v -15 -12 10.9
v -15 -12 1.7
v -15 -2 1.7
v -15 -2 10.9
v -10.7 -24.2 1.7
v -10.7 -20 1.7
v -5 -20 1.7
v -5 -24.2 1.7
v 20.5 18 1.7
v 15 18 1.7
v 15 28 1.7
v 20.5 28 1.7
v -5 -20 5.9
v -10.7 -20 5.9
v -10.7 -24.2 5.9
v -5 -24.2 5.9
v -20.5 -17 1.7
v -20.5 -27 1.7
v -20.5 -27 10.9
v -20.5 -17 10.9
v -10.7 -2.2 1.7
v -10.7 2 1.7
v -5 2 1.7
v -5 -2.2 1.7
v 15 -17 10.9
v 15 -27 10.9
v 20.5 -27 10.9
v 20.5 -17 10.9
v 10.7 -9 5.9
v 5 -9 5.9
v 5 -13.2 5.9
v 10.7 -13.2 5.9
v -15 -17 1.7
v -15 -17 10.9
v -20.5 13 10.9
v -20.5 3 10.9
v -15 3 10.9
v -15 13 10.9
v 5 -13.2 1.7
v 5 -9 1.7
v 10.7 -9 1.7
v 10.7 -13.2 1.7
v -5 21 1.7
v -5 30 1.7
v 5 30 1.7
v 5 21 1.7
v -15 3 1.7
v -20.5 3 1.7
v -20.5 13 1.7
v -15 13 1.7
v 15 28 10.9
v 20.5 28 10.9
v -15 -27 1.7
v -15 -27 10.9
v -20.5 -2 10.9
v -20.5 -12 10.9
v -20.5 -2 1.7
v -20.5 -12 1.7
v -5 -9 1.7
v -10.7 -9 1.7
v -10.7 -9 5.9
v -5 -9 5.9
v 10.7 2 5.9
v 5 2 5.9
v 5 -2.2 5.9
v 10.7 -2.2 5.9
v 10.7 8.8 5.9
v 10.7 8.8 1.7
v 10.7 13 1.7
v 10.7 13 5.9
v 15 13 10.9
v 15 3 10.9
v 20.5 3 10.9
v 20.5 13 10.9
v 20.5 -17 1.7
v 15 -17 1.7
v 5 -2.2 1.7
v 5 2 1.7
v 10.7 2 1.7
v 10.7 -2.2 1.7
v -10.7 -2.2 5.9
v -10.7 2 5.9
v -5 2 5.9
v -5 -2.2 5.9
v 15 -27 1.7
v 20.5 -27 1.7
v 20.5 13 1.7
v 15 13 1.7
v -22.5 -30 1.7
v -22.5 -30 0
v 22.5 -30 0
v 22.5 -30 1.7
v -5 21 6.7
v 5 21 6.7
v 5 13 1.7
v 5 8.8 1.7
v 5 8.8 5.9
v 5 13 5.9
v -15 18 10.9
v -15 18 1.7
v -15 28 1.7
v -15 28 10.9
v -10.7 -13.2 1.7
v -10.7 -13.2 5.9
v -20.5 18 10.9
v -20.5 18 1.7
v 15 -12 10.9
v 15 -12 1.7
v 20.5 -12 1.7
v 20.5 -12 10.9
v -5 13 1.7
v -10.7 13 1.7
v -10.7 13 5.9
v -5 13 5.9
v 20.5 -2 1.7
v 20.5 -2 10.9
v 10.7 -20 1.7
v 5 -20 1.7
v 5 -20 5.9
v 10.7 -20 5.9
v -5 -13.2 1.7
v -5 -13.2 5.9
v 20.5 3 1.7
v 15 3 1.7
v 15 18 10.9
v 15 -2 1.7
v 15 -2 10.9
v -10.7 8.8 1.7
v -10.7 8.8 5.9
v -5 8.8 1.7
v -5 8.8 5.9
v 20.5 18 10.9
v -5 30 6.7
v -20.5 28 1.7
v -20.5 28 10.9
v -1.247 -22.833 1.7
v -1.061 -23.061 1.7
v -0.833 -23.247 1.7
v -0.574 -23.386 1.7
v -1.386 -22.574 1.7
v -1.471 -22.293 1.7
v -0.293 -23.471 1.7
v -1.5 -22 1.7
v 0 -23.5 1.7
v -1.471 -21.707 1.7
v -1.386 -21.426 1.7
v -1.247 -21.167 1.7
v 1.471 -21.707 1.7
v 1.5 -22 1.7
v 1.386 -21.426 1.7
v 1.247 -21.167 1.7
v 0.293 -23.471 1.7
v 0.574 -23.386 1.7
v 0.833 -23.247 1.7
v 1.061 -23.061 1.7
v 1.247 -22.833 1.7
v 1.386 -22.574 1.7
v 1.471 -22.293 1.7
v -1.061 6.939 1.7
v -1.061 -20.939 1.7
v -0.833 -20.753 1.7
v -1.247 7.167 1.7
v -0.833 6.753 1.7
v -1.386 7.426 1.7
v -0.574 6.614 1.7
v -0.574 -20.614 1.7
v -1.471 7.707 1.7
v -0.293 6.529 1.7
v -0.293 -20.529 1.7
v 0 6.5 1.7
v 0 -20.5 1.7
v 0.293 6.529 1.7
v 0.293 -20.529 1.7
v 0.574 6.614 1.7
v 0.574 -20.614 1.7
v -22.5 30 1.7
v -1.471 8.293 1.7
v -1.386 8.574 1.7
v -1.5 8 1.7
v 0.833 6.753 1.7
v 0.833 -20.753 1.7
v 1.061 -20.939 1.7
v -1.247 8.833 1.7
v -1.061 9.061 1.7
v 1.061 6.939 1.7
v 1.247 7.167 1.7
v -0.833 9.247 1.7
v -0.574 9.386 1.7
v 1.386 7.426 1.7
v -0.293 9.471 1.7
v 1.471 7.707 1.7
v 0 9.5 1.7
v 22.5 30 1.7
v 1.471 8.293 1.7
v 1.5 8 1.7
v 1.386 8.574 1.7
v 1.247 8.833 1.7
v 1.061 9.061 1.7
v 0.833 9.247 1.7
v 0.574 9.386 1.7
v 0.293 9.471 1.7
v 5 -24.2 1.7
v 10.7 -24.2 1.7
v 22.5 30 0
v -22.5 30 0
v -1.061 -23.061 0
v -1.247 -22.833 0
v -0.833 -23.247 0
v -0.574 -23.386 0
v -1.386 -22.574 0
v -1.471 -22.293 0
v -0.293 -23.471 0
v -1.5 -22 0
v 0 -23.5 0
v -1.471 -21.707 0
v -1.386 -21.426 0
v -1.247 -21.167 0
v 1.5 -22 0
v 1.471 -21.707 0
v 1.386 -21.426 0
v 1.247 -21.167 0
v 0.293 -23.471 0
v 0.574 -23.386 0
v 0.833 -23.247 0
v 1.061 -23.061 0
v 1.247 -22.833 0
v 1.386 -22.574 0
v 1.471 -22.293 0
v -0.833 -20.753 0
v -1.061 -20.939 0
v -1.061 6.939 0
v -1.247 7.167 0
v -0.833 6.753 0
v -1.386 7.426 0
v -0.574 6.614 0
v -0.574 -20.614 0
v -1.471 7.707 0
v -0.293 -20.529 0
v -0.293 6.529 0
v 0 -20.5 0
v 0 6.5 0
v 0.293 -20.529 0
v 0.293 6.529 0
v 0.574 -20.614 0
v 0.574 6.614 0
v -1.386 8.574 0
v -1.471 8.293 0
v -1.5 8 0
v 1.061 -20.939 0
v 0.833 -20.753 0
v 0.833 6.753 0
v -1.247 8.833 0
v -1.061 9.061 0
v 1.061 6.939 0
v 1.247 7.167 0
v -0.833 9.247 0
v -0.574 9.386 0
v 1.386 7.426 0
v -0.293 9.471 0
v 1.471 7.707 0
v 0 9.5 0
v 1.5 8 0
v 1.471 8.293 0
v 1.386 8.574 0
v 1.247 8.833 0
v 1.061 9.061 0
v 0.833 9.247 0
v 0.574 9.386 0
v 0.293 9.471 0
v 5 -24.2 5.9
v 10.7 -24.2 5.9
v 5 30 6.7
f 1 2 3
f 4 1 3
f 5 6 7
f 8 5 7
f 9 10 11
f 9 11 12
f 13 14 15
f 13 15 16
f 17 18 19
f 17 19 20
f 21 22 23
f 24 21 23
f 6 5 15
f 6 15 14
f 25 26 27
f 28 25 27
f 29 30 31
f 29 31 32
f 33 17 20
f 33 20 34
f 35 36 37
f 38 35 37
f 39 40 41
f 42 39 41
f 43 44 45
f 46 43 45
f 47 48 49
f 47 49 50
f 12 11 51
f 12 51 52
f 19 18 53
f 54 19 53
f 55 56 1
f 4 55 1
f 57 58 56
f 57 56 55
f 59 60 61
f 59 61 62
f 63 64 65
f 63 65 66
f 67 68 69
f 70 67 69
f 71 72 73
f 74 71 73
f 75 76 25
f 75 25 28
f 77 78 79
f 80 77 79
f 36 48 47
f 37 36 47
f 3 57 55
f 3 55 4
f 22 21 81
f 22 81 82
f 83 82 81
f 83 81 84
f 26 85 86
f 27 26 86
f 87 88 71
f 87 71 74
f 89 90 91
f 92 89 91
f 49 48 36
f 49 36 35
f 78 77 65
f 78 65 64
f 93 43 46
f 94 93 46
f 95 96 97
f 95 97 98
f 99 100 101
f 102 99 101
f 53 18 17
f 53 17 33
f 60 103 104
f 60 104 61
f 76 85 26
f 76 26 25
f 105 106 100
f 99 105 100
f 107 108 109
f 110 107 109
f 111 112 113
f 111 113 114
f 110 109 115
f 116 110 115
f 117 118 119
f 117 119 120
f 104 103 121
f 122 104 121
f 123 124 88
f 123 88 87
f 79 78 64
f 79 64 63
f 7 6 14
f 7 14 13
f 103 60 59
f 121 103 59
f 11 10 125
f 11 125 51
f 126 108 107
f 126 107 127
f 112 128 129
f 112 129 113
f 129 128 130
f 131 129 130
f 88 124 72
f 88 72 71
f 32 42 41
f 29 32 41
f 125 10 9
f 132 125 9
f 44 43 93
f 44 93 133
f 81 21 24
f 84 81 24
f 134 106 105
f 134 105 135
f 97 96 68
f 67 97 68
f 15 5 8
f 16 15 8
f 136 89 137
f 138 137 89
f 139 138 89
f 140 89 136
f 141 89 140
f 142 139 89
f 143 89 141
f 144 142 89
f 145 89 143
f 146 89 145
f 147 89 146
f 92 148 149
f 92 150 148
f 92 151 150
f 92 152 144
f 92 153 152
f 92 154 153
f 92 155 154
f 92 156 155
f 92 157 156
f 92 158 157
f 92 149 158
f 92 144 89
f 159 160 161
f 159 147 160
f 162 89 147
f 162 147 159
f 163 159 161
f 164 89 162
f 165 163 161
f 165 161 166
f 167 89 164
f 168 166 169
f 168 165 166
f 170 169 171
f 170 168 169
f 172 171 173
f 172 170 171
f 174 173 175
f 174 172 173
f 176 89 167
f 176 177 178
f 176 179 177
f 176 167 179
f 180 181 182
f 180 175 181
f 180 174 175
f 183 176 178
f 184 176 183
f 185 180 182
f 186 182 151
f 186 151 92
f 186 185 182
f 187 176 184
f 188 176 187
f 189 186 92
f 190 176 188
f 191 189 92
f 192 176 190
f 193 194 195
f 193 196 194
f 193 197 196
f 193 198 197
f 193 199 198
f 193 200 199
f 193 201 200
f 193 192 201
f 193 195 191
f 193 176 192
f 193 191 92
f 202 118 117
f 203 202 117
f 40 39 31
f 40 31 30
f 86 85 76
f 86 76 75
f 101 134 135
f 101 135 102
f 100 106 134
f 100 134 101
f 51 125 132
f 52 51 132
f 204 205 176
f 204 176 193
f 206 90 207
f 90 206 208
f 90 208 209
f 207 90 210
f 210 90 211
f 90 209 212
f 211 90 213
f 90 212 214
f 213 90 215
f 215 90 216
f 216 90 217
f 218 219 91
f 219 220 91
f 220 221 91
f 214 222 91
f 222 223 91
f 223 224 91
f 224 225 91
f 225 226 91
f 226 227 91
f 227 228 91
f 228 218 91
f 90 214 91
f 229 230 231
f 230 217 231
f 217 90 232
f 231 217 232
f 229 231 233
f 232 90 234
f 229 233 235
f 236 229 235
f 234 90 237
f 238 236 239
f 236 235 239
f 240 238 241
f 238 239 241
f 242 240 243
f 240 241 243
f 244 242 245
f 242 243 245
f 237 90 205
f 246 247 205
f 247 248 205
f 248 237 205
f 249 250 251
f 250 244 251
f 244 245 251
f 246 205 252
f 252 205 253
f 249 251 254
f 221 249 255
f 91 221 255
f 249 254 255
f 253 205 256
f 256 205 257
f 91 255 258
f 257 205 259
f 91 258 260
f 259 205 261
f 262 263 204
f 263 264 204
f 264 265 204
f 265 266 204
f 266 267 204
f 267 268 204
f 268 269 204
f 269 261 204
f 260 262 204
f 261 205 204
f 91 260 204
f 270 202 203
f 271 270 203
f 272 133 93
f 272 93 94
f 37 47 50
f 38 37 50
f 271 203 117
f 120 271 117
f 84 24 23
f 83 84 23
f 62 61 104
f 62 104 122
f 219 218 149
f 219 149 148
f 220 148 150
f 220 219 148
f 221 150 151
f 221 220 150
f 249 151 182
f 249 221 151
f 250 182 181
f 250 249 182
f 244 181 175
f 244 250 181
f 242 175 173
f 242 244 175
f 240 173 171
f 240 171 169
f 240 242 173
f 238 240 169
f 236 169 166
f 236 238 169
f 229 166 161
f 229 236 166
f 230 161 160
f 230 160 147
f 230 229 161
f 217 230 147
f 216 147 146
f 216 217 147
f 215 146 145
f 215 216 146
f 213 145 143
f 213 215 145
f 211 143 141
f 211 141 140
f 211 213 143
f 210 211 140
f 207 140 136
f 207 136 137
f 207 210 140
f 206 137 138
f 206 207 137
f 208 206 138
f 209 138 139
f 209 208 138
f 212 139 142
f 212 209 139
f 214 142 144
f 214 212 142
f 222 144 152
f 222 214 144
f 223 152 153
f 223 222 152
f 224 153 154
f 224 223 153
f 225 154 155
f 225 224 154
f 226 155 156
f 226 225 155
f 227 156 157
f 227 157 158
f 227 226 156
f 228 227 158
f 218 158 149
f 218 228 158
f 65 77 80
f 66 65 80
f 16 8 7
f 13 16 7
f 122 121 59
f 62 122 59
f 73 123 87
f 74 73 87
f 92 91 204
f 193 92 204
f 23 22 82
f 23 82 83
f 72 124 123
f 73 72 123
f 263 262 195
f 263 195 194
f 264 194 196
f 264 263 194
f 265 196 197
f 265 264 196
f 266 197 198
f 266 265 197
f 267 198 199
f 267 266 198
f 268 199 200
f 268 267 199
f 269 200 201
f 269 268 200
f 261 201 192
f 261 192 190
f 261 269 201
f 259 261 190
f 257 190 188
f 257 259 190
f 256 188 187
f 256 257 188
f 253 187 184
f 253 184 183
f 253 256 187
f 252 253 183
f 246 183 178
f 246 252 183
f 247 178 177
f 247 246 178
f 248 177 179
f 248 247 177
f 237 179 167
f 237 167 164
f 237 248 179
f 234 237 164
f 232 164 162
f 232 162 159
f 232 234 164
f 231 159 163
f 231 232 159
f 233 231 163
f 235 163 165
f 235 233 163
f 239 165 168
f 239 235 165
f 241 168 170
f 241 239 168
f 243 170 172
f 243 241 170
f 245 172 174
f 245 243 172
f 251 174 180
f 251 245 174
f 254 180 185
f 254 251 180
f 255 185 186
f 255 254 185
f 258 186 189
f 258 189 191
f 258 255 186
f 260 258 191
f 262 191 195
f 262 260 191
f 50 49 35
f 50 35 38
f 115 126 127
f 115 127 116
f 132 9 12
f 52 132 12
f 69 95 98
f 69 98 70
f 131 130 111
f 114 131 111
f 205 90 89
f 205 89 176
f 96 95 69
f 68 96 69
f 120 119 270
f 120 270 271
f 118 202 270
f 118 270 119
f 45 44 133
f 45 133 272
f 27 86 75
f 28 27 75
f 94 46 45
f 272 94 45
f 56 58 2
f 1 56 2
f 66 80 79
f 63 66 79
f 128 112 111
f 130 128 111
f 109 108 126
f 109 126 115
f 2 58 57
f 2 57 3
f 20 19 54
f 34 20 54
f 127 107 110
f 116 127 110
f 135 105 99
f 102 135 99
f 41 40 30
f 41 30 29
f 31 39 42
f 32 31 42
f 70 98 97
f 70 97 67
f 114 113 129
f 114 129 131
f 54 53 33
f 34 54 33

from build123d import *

# Parameters (mm, degrees)
SKETCH_1_W        = 45
SKETCH_1_H        = 60
SKETCH_1_R        = 1.5
EXTRUDE_379_DEPTH = 1.7
SKETCH_2_W        = 10
SKETCH_2_H        = 9
XT30_DEPTH        = 5
SKETCH_3_W        = 5.5
SKETCH_3_H        = 10
XT30_2_DEPTH      = 9.2
XT30_2_2_DEPTH    = 9.2
XT30_2_3_DEPTH    = 9.2
XT30_2_4_DEPTH    = 9.2
XT30_2_5_DEPTH    = 9.2
XT30_2_6_DEPTH    = 9.2
XT30_2_7_DEPTH    = 9.2
XT30_2_8_DEPTH    = 9.2
SKETCH_4_W        = 5.7
SKETCH_4_H        = 4.2
CAN_DEPTH         = 4.2
CAN_2_DEPTH       = 4.2
CAN_3_DEPTH       = 4.2
CAN_4_DEPTH       = 4.2
CAN_5_DEPTH       = 4.2
CAN_6_DEPTH       = 4.2
CAN_7_DEPTH       = 4.2
CAN_8_DEPTH       = 4.2


with BuildPart() as part:
    # 草图1 → Extrude 379 (new body)
    with BuildSketch(Plane.XY):
        Rectangle(SKETCH_1_W, SKETCH_1_H)
        with Locations((0, -22)):
            Circle(SKETCH_1_R, mode=Mode.SUBTRACT)
        with Locations((0, 8)):
            Circle(SKETCH_1_R, mode=Mode.SUBTRACT)
    extrude(amount=EXTRUDE_379_DEPTH)


with BuildPart() as body_2:
    # 草图2 → xt30 (new body)
    with BuildSketch(Plane.XY.offset(1.7)):
        with Locations((0, 25.5)):
            Rectangle(SKETCH_2_W, SKETCH_2_H)
    extrude(amount=XT30_DEPTH)


with BuildPart() as body_3:
    # 草图3 → xt30 2 (new body)
    with BuildSketch(Plane.XY.offset(1.7)):
        with Locations((-17.75, 23)):
            Rectangle(SKETCH_3_W, SKETCH_3_H)
    extrude(amount=XT30_2_DEPTH)


with BuildPart() as body_4:
    # 草图3 → xt30 2 2 (new body)
    with BuildSketch(Plane.XY.offset(1.7)):
        with Locations((-17.75, 8)):
            Rectangle(SKETCH_3_W, SKETCH_3_H)
    extrude(amount=XT30_2_2_DEPTH)


with BuildPart() as body_5:
    # 草图3 → xt30 2 3 (new body)
    with BuildSketch(Plane.XY.offset(1.7)):
        with Locations((-17.75, -7)):
            Rectangle(SKETCH_3_W, SKETCH_3_H)
    extrude(amount=XT30_2_3_DEPTH)


with BuildPart() as body_6:
    # 草图3 → xt30 2 4 (new body)
    with BuildSketch(Plane.XY.offset(1.7)):
        with Locations((-17.75, -22)):
            Rectangle(SKETCH_3_W, SKETCH_3_H)
    extrude(amount=XT30_2_4_DEPTH)


with BuildPart() as body_7:
    # 草图3 → xt30 2 5 (new body)
    with BuildSketch(Plane.XY.offset(1.7)):
        with Locations((17.75, -22)):
            Rectangle(SKETCH_3_W, SKETCH_3_H)
    extrude(amount=XT30_2_5_DEPTH)


with BuildPart() as body_8:
    # 草图3 → xt30 2 6 (new body)
    with BuildSketch(Plane.XY.offset(1.7)):
        with Locations((17.75, -7)):
            Rectangle(SKETCH_3_W, SKETCH_3_H)
    extrude(amount=XT30_2_6_DEPTH)


with BuildPart() as body_9:
    # 草图3 → xt30 2 7 (new body)
    with BuildSketch(Plane.XY.offset(1.7)):
        with Locations((17.75, 8)):
            Rectangle(SKETCH_3_W, SKETCH_3_H)
    extrude(amount=XT30_2_7_DEPTH)


with BuildPart() as body_10:
    # 草图3 → xt30 2 8 (new body)
    with BuildSketch(Plane.XY.offset(1.7)):
        with Locations((17.75, 23)):
            Rectangle(SKETCH_3_W, SKETCH_3_H)
    extrude(amount=XT30_2_8_DEPTH)


with BuildPart() as body_11:
    # 草图4 → can (new body)
    with BuildSketch(Plane.XY.offset(1.7)):
        with Locations((-7.85, 10.9)):
            Rectangle(SKETCH_4_W, SKETCH_4_H)
    extrude(amount=CAN_DEPTH)


with BuildPart() as body_12:
    # 草图4 → can 2 (new body)
    with BuildSketch(Plane.XY.offset(1.7)):
        with Locations((-7.85, -0.1)):
            Rectangle(SKETCH_4_W, SKETCH_4_H)
    extrude(amount=CAN_2_DEPTH)


with BuildPart() as body_13:
    # 草图4 → can 3 (new body)
    with BuildSketch(Plane.XY.offset(1.7)):
        with Locations((-7.85, -11.1)):
            Rectangle(SKETCH_4_W, SKETCH_4_H)
    extrude(amount=CAN_3_DEPTH)


with BuildPart() as body_14:
    # 草图4 → can 4 (new body)
    with BuildSketch(Plane.XY.offset(1.7)):
        with Locations((-7.85, -22.1)):
            Rectangle(SKETCH_4_W, SKETCH_4_H)
    extrude(amount=CAN_4_DEPTH)


with BuildPart() as body_15:
    # 草图4 → can 5 (new body)
    with BuildSketch(Plane.XY.offset(1.7)):
        with Locations((7.85, -22.1)):
            Rectangle(SKETCH_4_W, SKETCH_4_H)
    extrude(amount=CAN_5_DEPTH)


with BuildPart() as body_16:
    # 草图4 → can 6 (new body)
    with BuildSketch(Plane.XY.offset(1.7)):
        with Locations((7.85, -11.1)):
            Rectangle(SKETCH_4_W, SKETCH_4_H)
    extrude(amount=CAN_6_DEPTH)


with BuildPart() as body_17:
    # 草图4 → can 7 (new body)
    with BuildSketch(Plane.XY.offset(1.7)):
        with Locations((7.85, -0.1)):
            Rectangle(SKETCH_4_W, SKETCH_4_H)
    extrude(amount=CAN_7_DEPTH)


with BuildPart() as body_18:
    # 草图4 → can 8 (new body)
    with BuildSketch(Plane.XY.offset(1.7)):
        with Locations((7.85, 10.9)):
            Rectangle(SKETCH_4_W, SKETCH_4_H)
    extrude(amount=CAN_8_DEPTH)


solid = Compound([part.part, body_2.part, body_3.part, body_4.part, body_5.part, body_6.part, body_7.part, body_8.part, body_9.part, body_10.part, body_11.part, body_12.part, body_13.part, body_14.part, body_15.part, body_16.part, body_17.part, body_18.part])
